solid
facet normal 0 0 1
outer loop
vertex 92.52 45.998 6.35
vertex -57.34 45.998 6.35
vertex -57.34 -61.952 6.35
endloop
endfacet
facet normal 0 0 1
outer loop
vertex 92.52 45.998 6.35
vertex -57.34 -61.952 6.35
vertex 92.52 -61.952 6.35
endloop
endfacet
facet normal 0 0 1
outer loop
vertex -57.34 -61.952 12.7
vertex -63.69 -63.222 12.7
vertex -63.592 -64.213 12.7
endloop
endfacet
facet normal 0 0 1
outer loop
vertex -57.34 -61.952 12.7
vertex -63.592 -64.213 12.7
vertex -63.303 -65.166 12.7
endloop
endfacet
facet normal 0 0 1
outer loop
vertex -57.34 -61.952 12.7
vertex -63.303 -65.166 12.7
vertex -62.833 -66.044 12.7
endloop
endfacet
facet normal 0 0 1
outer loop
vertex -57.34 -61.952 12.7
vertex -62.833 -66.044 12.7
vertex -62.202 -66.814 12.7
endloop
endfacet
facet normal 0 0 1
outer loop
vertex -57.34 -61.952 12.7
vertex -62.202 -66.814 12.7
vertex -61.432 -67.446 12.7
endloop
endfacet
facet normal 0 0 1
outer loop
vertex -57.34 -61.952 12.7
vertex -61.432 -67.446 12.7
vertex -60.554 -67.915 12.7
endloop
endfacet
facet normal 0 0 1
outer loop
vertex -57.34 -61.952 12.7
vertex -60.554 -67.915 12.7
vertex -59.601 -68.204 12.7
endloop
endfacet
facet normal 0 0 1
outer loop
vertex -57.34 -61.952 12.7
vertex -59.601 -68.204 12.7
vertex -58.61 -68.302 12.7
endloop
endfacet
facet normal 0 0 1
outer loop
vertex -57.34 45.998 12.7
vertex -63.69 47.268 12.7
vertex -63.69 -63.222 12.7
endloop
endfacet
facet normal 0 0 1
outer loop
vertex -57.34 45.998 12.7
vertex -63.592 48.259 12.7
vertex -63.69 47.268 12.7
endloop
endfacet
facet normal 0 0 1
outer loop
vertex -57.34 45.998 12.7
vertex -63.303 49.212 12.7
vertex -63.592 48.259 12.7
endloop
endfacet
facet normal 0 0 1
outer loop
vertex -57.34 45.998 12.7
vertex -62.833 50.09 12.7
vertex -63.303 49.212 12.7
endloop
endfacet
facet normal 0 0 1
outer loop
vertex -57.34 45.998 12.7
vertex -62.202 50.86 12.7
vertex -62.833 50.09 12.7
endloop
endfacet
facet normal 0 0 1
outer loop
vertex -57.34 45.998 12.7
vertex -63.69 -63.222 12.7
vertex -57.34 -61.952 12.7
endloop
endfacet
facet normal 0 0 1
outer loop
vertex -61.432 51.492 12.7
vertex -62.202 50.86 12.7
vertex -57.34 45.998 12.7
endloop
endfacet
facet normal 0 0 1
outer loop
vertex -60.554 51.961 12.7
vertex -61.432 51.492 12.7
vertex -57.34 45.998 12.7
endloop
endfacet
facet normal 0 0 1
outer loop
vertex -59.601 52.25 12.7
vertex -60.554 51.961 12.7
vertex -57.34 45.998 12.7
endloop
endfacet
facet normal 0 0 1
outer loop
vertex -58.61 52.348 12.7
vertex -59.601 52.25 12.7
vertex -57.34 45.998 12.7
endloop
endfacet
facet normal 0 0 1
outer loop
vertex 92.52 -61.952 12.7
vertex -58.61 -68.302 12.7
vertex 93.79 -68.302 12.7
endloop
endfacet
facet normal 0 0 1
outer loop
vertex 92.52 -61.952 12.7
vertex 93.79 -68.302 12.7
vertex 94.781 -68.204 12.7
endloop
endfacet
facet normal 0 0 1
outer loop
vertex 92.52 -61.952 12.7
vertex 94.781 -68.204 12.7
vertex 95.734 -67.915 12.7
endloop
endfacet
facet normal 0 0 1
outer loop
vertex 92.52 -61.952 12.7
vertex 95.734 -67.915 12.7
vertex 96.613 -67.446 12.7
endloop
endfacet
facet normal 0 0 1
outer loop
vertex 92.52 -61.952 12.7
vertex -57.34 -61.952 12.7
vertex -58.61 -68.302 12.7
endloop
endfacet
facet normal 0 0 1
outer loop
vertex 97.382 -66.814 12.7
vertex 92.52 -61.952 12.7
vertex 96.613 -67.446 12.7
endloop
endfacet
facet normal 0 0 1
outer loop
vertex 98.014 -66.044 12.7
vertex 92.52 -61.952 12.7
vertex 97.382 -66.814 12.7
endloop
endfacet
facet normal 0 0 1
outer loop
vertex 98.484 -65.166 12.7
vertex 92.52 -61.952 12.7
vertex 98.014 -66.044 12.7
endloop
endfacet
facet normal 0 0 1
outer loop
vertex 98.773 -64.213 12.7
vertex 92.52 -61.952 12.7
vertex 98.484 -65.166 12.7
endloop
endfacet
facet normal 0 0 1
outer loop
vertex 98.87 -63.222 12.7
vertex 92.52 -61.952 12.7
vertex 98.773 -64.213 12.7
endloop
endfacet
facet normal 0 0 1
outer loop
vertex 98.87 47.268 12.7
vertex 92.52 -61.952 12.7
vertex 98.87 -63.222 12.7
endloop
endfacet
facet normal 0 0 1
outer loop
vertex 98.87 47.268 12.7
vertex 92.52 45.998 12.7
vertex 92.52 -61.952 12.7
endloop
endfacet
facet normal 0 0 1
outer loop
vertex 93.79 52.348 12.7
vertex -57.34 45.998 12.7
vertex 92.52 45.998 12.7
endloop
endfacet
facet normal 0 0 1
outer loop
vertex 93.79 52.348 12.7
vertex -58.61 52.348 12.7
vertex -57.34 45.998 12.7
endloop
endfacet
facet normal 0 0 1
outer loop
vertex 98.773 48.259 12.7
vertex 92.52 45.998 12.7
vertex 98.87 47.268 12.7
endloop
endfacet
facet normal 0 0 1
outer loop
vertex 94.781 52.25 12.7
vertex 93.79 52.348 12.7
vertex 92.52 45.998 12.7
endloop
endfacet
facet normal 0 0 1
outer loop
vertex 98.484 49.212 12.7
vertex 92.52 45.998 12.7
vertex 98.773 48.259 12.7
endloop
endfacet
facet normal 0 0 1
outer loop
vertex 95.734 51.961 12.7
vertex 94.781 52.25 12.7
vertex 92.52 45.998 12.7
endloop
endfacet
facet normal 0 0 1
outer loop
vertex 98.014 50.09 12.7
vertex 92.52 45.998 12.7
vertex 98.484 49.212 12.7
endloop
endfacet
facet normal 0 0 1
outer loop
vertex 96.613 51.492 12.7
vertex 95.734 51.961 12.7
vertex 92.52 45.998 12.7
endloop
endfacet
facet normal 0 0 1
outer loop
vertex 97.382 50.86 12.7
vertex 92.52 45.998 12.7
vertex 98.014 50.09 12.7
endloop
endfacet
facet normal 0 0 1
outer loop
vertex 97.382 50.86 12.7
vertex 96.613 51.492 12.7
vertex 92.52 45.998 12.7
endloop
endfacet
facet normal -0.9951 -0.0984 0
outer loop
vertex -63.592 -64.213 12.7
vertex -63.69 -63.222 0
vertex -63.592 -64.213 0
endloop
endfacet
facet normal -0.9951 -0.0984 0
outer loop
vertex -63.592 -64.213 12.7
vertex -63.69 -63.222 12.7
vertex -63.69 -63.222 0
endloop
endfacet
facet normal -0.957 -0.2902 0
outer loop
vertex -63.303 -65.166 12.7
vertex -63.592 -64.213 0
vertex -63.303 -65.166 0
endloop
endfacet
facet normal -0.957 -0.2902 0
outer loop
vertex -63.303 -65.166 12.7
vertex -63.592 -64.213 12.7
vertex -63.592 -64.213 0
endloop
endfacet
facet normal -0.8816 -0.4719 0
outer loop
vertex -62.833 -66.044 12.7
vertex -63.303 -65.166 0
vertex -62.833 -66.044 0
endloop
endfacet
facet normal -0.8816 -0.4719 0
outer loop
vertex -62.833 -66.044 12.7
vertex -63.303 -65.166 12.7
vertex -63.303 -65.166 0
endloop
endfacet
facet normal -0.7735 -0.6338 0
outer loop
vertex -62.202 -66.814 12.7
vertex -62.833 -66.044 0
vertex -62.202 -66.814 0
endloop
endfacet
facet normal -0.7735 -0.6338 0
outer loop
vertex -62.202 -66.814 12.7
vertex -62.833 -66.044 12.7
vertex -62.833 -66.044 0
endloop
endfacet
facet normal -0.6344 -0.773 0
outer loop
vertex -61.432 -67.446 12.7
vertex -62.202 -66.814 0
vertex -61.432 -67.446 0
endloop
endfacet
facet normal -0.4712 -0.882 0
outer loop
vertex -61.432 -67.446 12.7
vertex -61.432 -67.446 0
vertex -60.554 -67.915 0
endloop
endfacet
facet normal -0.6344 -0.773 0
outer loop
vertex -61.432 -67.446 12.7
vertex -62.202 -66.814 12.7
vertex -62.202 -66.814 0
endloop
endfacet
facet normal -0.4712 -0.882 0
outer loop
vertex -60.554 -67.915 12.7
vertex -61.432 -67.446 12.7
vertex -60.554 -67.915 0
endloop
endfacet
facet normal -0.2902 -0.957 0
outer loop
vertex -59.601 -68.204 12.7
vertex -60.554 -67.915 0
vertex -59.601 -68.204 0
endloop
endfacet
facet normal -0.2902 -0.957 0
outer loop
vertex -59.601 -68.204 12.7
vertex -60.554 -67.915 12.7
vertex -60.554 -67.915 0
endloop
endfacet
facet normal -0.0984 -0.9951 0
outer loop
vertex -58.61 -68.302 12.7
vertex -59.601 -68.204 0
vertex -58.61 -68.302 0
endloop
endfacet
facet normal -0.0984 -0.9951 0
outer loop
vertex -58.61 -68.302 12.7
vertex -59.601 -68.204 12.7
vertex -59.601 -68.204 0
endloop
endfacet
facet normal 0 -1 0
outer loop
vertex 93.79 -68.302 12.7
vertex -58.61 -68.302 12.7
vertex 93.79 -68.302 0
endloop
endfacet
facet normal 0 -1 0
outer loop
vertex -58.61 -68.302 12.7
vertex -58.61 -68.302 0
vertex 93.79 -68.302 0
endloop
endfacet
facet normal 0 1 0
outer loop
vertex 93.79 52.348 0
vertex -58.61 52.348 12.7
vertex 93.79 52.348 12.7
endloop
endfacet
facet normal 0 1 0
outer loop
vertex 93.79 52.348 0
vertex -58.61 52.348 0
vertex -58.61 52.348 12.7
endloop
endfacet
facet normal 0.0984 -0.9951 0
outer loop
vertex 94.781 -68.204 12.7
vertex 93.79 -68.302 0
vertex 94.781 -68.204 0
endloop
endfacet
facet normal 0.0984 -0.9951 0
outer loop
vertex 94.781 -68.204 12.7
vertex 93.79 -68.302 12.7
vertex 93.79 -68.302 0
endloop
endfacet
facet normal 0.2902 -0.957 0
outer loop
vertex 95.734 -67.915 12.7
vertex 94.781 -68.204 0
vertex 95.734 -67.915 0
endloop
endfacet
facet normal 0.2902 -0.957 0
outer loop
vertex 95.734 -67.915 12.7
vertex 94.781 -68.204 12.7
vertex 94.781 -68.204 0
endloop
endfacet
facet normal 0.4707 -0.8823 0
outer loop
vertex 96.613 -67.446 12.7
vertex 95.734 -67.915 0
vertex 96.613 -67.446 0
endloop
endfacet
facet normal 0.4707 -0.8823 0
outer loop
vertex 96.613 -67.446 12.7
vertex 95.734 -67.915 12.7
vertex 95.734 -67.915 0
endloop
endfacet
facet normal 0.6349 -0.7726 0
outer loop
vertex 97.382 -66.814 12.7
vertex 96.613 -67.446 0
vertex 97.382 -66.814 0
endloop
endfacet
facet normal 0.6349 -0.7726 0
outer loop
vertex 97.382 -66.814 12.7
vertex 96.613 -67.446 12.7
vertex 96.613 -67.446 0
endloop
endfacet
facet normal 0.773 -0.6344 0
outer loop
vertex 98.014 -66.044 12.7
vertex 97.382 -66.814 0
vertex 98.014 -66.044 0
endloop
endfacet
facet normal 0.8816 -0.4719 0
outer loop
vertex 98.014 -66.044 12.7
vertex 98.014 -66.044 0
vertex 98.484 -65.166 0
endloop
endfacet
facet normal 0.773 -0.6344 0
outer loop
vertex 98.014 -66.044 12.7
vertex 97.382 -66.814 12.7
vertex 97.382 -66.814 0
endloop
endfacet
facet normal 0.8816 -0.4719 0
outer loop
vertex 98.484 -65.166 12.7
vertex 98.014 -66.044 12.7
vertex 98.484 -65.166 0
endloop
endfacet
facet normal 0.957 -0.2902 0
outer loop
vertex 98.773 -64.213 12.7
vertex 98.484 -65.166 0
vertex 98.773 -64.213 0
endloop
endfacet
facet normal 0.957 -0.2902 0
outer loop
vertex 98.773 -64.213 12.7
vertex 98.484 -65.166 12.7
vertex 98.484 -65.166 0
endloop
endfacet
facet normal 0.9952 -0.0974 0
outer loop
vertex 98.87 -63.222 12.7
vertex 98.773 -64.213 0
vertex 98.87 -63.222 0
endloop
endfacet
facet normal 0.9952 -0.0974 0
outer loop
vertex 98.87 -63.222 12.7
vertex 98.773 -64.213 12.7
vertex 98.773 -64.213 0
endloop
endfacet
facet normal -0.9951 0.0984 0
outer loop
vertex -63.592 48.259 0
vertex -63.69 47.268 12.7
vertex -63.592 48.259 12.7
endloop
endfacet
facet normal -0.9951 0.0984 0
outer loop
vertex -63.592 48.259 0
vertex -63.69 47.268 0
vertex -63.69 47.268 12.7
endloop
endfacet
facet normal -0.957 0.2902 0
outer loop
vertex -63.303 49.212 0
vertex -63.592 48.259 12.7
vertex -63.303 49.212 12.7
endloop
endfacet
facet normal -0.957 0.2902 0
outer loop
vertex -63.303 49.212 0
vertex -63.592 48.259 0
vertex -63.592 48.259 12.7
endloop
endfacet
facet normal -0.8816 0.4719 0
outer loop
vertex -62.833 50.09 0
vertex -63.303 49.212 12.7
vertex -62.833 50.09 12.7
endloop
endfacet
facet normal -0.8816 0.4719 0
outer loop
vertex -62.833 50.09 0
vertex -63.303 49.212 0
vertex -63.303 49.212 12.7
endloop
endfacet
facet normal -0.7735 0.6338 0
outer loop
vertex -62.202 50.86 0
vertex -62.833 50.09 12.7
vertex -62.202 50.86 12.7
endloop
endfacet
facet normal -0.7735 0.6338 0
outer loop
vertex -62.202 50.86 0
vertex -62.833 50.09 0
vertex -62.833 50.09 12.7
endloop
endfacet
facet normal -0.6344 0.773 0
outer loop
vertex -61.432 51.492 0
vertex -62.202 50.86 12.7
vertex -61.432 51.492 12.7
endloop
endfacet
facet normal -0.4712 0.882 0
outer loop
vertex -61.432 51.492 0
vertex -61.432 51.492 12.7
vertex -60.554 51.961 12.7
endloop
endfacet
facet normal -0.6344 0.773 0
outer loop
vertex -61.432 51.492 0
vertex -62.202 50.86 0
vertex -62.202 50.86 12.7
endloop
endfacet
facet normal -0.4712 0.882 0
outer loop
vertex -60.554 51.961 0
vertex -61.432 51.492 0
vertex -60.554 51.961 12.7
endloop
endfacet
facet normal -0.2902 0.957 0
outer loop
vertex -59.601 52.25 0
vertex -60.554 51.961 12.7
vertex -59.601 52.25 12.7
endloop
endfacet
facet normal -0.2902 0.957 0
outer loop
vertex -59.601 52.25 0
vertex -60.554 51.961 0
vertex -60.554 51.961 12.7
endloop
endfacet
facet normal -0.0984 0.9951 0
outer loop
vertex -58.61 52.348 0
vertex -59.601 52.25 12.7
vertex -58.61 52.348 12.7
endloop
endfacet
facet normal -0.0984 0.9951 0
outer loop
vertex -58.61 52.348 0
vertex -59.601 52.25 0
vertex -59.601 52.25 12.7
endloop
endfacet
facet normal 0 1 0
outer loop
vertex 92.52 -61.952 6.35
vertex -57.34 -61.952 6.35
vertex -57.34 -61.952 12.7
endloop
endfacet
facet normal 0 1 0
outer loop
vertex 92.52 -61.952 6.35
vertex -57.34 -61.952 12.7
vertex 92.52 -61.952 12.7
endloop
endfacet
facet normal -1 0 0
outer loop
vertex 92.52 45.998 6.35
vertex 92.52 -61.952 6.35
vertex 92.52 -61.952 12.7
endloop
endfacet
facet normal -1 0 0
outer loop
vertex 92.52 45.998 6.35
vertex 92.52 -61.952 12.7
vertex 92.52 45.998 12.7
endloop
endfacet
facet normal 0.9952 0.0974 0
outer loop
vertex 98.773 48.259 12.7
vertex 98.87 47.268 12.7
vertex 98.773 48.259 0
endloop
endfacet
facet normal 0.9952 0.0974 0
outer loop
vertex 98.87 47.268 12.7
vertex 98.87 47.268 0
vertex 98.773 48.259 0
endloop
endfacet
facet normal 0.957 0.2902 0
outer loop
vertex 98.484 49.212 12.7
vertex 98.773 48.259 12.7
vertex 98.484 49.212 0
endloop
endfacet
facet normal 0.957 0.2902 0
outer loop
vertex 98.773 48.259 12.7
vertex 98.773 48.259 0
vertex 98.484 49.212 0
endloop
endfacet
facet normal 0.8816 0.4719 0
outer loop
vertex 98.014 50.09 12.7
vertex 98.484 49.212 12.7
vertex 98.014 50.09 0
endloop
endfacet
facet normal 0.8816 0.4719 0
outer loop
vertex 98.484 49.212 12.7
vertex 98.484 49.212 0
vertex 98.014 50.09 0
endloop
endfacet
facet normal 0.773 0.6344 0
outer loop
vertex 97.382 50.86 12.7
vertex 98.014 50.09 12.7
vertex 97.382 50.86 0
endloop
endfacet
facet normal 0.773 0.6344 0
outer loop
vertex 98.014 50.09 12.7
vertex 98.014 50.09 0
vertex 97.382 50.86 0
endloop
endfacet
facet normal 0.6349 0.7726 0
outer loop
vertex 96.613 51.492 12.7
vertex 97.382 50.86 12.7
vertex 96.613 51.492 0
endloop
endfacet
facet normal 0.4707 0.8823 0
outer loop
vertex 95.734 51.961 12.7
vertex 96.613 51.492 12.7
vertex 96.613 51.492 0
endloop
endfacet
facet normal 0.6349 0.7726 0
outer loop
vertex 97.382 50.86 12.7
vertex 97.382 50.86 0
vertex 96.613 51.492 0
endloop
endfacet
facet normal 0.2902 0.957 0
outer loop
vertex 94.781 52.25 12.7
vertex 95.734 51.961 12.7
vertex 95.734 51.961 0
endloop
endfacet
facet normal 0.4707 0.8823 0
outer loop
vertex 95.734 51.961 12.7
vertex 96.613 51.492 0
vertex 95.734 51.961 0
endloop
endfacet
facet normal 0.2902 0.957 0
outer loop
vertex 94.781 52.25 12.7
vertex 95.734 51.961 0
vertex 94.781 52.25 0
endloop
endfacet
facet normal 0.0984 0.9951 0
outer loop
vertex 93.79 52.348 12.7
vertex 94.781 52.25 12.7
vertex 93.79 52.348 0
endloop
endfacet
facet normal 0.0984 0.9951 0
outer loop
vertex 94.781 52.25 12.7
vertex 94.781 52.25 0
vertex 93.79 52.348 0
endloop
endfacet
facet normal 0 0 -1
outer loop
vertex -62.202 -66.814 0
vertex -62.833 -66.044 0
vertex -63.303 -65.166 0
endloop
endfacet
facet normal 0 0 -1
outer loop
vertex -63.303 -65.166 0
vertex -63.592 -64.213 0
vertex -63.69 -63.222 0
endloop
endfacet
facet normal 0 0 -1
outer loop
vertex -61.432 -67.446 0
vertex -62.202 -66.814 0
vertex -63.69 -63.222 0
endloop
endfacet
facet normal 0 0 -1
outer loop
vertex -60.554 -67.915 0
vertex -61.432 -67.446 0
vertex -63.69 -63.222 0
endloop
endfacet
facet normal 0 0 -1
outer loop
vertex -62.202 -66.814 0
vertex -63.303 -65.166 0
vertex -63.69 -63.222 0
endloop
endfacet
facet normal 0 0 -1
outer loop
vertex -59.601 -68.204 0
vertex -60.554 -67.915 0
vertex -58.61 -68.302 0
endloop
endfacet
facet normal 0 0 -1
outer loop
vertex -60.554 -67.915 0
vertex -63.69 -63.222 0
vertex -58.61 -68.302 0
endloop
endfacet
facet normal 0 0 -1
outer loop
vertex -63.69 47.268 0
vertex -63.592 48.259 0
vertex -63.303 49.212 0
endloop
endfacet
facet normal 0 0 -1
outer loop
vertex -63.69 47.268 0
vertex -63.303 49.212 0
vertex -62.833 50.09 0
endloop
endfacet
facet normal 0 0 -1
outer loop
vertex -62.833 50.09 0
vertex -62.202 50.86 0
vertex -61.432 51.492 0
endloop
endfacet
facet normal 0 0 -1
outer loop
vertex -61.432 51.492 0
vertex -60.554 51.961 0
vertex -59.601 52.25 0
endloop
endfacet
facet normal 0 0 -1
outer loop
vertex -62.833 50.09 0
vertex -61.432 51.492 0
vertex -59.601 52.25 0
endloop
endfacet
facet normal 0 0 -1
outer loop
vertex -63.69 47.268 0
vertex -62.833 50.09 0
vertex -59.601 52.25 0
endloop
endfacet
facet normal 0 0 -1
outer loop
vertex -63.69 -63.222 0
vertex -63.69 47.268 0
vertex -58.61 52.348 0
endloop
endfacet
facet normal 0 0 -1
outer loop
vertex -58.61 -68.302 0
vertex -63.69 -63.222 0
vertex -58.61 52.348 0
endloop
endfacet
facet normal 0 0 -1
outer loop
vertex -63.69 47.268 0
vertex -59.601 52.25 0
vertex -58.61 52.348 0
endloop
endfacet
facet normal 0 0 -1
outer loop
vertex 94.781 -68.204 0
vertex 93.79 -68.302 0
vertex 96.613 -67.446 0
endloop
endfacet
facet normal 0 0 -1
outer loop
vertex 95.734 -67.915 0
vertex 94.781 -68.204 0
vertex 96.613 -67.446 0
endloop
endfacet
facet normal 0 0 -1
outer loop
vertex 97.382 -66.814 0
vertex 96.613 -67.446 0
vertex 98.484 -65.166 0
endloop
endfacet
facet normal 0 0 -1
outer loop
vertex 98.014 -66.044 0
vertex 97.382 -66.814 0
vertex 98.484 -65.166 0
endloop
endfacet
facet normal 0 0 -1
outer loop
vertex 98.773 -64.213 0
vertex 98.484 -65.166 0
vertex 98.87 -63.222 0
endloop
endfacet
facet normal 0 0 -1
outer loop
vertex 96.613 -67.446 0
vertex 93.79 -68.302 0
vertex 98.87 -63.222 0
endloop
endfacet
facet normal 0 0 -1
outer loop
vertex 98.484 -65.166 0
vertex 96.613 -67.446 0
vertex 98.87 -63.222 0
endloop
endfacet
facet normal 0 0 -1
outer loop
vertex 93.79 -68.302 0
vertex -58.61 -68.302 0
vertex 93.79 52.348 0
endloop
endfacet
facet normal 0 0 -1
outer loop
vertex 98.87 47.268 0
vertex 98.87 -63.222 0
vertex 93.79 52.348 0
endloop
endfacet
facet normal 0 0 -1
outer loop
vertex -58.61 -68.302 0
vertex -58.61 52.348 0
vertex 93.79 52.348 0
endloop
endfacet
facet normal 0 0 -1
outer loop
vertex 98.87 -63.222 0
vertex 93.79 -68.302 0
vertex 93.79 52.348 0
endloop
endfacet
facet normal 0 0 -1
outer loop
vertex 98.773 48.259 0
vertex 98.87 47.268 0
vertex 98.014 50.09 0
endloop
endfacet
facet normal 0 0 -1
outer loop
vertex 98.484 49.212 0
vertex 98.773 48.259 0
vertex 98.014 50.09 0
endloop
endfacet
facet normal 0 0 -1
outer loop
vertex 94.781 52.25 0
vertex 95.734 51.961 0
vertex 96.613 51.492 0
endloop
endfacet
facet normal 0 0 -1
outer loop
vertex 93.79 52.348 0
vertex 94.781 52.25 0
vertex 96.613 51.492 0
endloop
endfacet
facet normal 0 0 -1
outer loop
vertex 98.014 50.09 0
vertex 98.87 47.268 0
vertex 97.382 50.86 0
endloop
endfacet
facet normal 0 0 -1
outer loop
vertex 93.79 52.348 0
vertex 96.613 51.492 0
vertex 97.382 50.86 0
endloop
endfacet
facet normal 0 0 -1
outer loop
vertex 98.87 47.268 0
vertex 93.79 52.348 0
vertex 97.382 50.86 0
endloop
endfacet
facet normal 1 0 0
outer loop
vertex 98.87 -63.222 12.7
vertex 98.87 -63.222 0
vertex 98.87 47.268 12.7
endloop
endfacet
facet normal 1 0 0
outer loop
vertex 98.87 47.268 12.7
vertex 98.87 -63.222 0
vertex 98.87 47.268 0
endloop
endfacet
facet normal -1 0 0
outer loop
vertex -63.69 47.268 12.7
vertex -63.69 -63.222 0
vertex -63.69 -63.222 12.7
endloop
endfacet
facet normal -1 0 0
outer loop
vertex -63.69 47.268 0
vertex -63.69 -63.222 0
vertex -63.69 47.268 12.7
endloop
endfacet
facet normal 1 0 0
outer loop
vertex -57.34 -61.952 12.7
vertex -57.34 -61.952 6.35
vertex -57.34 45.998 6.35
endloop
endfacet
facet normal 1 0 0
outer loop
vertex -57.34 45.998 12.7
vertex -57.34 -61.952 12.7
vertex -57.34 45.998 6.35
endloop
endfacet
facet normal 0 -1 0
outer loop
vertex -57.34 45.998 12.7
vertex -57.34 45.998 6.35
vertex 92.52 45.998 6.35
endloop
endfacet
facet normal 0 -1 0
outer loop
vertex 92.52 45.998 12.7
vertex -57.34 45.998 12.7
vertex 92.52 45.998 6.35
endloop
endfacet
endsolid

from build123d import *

# Parameters (mm, degrees)
F0_W     = 162.56
F0_H     = 120.65
F1_DEPTH = 6.35
F2_W     = 162.56
F2_H     = 120.65
F2_W_2   = 149.86
F2_H_2   = 107.95
F3_DEPTH = 6.35
F4_R     = 5.08


with BuildPart() as f1:
    # F0 (on Top) → F1 (new body)
    with BuildSketch(Plane.XY):
        with Locations((17.590381, -7.976995)):
            Rectangle(F0_W, F0_H)
    extrude(amount=F1_DEPTH)

    # F2 (on face) → F3 (join)
    with BuildSketch(Plane.XY.offset(6.35)):
        with Locations((17.590381, -7.976995)):
            Rectangle(F2_W, F2_H)
        with Locations((17.590381, -7.976995)):
            Rectangle(F2_W_2, F2_H_2, mode=Mode.SUBTRACT)
    extrude(amount=F3_DEPTH)

    # F4
    f4_edges = [f1.edges().sort_by_distance(p)[0] for p in [
        (98.870381, -68.301995, 6.35),
        (98.870381, 52.348005, 6.35),
        (-63.689619, 52.348005, 6.35),
        (-63.689619, -68.301995, 6.35),
    ]]
    fillet(f4_edges, radius=F4_R)


solid = f1.part
